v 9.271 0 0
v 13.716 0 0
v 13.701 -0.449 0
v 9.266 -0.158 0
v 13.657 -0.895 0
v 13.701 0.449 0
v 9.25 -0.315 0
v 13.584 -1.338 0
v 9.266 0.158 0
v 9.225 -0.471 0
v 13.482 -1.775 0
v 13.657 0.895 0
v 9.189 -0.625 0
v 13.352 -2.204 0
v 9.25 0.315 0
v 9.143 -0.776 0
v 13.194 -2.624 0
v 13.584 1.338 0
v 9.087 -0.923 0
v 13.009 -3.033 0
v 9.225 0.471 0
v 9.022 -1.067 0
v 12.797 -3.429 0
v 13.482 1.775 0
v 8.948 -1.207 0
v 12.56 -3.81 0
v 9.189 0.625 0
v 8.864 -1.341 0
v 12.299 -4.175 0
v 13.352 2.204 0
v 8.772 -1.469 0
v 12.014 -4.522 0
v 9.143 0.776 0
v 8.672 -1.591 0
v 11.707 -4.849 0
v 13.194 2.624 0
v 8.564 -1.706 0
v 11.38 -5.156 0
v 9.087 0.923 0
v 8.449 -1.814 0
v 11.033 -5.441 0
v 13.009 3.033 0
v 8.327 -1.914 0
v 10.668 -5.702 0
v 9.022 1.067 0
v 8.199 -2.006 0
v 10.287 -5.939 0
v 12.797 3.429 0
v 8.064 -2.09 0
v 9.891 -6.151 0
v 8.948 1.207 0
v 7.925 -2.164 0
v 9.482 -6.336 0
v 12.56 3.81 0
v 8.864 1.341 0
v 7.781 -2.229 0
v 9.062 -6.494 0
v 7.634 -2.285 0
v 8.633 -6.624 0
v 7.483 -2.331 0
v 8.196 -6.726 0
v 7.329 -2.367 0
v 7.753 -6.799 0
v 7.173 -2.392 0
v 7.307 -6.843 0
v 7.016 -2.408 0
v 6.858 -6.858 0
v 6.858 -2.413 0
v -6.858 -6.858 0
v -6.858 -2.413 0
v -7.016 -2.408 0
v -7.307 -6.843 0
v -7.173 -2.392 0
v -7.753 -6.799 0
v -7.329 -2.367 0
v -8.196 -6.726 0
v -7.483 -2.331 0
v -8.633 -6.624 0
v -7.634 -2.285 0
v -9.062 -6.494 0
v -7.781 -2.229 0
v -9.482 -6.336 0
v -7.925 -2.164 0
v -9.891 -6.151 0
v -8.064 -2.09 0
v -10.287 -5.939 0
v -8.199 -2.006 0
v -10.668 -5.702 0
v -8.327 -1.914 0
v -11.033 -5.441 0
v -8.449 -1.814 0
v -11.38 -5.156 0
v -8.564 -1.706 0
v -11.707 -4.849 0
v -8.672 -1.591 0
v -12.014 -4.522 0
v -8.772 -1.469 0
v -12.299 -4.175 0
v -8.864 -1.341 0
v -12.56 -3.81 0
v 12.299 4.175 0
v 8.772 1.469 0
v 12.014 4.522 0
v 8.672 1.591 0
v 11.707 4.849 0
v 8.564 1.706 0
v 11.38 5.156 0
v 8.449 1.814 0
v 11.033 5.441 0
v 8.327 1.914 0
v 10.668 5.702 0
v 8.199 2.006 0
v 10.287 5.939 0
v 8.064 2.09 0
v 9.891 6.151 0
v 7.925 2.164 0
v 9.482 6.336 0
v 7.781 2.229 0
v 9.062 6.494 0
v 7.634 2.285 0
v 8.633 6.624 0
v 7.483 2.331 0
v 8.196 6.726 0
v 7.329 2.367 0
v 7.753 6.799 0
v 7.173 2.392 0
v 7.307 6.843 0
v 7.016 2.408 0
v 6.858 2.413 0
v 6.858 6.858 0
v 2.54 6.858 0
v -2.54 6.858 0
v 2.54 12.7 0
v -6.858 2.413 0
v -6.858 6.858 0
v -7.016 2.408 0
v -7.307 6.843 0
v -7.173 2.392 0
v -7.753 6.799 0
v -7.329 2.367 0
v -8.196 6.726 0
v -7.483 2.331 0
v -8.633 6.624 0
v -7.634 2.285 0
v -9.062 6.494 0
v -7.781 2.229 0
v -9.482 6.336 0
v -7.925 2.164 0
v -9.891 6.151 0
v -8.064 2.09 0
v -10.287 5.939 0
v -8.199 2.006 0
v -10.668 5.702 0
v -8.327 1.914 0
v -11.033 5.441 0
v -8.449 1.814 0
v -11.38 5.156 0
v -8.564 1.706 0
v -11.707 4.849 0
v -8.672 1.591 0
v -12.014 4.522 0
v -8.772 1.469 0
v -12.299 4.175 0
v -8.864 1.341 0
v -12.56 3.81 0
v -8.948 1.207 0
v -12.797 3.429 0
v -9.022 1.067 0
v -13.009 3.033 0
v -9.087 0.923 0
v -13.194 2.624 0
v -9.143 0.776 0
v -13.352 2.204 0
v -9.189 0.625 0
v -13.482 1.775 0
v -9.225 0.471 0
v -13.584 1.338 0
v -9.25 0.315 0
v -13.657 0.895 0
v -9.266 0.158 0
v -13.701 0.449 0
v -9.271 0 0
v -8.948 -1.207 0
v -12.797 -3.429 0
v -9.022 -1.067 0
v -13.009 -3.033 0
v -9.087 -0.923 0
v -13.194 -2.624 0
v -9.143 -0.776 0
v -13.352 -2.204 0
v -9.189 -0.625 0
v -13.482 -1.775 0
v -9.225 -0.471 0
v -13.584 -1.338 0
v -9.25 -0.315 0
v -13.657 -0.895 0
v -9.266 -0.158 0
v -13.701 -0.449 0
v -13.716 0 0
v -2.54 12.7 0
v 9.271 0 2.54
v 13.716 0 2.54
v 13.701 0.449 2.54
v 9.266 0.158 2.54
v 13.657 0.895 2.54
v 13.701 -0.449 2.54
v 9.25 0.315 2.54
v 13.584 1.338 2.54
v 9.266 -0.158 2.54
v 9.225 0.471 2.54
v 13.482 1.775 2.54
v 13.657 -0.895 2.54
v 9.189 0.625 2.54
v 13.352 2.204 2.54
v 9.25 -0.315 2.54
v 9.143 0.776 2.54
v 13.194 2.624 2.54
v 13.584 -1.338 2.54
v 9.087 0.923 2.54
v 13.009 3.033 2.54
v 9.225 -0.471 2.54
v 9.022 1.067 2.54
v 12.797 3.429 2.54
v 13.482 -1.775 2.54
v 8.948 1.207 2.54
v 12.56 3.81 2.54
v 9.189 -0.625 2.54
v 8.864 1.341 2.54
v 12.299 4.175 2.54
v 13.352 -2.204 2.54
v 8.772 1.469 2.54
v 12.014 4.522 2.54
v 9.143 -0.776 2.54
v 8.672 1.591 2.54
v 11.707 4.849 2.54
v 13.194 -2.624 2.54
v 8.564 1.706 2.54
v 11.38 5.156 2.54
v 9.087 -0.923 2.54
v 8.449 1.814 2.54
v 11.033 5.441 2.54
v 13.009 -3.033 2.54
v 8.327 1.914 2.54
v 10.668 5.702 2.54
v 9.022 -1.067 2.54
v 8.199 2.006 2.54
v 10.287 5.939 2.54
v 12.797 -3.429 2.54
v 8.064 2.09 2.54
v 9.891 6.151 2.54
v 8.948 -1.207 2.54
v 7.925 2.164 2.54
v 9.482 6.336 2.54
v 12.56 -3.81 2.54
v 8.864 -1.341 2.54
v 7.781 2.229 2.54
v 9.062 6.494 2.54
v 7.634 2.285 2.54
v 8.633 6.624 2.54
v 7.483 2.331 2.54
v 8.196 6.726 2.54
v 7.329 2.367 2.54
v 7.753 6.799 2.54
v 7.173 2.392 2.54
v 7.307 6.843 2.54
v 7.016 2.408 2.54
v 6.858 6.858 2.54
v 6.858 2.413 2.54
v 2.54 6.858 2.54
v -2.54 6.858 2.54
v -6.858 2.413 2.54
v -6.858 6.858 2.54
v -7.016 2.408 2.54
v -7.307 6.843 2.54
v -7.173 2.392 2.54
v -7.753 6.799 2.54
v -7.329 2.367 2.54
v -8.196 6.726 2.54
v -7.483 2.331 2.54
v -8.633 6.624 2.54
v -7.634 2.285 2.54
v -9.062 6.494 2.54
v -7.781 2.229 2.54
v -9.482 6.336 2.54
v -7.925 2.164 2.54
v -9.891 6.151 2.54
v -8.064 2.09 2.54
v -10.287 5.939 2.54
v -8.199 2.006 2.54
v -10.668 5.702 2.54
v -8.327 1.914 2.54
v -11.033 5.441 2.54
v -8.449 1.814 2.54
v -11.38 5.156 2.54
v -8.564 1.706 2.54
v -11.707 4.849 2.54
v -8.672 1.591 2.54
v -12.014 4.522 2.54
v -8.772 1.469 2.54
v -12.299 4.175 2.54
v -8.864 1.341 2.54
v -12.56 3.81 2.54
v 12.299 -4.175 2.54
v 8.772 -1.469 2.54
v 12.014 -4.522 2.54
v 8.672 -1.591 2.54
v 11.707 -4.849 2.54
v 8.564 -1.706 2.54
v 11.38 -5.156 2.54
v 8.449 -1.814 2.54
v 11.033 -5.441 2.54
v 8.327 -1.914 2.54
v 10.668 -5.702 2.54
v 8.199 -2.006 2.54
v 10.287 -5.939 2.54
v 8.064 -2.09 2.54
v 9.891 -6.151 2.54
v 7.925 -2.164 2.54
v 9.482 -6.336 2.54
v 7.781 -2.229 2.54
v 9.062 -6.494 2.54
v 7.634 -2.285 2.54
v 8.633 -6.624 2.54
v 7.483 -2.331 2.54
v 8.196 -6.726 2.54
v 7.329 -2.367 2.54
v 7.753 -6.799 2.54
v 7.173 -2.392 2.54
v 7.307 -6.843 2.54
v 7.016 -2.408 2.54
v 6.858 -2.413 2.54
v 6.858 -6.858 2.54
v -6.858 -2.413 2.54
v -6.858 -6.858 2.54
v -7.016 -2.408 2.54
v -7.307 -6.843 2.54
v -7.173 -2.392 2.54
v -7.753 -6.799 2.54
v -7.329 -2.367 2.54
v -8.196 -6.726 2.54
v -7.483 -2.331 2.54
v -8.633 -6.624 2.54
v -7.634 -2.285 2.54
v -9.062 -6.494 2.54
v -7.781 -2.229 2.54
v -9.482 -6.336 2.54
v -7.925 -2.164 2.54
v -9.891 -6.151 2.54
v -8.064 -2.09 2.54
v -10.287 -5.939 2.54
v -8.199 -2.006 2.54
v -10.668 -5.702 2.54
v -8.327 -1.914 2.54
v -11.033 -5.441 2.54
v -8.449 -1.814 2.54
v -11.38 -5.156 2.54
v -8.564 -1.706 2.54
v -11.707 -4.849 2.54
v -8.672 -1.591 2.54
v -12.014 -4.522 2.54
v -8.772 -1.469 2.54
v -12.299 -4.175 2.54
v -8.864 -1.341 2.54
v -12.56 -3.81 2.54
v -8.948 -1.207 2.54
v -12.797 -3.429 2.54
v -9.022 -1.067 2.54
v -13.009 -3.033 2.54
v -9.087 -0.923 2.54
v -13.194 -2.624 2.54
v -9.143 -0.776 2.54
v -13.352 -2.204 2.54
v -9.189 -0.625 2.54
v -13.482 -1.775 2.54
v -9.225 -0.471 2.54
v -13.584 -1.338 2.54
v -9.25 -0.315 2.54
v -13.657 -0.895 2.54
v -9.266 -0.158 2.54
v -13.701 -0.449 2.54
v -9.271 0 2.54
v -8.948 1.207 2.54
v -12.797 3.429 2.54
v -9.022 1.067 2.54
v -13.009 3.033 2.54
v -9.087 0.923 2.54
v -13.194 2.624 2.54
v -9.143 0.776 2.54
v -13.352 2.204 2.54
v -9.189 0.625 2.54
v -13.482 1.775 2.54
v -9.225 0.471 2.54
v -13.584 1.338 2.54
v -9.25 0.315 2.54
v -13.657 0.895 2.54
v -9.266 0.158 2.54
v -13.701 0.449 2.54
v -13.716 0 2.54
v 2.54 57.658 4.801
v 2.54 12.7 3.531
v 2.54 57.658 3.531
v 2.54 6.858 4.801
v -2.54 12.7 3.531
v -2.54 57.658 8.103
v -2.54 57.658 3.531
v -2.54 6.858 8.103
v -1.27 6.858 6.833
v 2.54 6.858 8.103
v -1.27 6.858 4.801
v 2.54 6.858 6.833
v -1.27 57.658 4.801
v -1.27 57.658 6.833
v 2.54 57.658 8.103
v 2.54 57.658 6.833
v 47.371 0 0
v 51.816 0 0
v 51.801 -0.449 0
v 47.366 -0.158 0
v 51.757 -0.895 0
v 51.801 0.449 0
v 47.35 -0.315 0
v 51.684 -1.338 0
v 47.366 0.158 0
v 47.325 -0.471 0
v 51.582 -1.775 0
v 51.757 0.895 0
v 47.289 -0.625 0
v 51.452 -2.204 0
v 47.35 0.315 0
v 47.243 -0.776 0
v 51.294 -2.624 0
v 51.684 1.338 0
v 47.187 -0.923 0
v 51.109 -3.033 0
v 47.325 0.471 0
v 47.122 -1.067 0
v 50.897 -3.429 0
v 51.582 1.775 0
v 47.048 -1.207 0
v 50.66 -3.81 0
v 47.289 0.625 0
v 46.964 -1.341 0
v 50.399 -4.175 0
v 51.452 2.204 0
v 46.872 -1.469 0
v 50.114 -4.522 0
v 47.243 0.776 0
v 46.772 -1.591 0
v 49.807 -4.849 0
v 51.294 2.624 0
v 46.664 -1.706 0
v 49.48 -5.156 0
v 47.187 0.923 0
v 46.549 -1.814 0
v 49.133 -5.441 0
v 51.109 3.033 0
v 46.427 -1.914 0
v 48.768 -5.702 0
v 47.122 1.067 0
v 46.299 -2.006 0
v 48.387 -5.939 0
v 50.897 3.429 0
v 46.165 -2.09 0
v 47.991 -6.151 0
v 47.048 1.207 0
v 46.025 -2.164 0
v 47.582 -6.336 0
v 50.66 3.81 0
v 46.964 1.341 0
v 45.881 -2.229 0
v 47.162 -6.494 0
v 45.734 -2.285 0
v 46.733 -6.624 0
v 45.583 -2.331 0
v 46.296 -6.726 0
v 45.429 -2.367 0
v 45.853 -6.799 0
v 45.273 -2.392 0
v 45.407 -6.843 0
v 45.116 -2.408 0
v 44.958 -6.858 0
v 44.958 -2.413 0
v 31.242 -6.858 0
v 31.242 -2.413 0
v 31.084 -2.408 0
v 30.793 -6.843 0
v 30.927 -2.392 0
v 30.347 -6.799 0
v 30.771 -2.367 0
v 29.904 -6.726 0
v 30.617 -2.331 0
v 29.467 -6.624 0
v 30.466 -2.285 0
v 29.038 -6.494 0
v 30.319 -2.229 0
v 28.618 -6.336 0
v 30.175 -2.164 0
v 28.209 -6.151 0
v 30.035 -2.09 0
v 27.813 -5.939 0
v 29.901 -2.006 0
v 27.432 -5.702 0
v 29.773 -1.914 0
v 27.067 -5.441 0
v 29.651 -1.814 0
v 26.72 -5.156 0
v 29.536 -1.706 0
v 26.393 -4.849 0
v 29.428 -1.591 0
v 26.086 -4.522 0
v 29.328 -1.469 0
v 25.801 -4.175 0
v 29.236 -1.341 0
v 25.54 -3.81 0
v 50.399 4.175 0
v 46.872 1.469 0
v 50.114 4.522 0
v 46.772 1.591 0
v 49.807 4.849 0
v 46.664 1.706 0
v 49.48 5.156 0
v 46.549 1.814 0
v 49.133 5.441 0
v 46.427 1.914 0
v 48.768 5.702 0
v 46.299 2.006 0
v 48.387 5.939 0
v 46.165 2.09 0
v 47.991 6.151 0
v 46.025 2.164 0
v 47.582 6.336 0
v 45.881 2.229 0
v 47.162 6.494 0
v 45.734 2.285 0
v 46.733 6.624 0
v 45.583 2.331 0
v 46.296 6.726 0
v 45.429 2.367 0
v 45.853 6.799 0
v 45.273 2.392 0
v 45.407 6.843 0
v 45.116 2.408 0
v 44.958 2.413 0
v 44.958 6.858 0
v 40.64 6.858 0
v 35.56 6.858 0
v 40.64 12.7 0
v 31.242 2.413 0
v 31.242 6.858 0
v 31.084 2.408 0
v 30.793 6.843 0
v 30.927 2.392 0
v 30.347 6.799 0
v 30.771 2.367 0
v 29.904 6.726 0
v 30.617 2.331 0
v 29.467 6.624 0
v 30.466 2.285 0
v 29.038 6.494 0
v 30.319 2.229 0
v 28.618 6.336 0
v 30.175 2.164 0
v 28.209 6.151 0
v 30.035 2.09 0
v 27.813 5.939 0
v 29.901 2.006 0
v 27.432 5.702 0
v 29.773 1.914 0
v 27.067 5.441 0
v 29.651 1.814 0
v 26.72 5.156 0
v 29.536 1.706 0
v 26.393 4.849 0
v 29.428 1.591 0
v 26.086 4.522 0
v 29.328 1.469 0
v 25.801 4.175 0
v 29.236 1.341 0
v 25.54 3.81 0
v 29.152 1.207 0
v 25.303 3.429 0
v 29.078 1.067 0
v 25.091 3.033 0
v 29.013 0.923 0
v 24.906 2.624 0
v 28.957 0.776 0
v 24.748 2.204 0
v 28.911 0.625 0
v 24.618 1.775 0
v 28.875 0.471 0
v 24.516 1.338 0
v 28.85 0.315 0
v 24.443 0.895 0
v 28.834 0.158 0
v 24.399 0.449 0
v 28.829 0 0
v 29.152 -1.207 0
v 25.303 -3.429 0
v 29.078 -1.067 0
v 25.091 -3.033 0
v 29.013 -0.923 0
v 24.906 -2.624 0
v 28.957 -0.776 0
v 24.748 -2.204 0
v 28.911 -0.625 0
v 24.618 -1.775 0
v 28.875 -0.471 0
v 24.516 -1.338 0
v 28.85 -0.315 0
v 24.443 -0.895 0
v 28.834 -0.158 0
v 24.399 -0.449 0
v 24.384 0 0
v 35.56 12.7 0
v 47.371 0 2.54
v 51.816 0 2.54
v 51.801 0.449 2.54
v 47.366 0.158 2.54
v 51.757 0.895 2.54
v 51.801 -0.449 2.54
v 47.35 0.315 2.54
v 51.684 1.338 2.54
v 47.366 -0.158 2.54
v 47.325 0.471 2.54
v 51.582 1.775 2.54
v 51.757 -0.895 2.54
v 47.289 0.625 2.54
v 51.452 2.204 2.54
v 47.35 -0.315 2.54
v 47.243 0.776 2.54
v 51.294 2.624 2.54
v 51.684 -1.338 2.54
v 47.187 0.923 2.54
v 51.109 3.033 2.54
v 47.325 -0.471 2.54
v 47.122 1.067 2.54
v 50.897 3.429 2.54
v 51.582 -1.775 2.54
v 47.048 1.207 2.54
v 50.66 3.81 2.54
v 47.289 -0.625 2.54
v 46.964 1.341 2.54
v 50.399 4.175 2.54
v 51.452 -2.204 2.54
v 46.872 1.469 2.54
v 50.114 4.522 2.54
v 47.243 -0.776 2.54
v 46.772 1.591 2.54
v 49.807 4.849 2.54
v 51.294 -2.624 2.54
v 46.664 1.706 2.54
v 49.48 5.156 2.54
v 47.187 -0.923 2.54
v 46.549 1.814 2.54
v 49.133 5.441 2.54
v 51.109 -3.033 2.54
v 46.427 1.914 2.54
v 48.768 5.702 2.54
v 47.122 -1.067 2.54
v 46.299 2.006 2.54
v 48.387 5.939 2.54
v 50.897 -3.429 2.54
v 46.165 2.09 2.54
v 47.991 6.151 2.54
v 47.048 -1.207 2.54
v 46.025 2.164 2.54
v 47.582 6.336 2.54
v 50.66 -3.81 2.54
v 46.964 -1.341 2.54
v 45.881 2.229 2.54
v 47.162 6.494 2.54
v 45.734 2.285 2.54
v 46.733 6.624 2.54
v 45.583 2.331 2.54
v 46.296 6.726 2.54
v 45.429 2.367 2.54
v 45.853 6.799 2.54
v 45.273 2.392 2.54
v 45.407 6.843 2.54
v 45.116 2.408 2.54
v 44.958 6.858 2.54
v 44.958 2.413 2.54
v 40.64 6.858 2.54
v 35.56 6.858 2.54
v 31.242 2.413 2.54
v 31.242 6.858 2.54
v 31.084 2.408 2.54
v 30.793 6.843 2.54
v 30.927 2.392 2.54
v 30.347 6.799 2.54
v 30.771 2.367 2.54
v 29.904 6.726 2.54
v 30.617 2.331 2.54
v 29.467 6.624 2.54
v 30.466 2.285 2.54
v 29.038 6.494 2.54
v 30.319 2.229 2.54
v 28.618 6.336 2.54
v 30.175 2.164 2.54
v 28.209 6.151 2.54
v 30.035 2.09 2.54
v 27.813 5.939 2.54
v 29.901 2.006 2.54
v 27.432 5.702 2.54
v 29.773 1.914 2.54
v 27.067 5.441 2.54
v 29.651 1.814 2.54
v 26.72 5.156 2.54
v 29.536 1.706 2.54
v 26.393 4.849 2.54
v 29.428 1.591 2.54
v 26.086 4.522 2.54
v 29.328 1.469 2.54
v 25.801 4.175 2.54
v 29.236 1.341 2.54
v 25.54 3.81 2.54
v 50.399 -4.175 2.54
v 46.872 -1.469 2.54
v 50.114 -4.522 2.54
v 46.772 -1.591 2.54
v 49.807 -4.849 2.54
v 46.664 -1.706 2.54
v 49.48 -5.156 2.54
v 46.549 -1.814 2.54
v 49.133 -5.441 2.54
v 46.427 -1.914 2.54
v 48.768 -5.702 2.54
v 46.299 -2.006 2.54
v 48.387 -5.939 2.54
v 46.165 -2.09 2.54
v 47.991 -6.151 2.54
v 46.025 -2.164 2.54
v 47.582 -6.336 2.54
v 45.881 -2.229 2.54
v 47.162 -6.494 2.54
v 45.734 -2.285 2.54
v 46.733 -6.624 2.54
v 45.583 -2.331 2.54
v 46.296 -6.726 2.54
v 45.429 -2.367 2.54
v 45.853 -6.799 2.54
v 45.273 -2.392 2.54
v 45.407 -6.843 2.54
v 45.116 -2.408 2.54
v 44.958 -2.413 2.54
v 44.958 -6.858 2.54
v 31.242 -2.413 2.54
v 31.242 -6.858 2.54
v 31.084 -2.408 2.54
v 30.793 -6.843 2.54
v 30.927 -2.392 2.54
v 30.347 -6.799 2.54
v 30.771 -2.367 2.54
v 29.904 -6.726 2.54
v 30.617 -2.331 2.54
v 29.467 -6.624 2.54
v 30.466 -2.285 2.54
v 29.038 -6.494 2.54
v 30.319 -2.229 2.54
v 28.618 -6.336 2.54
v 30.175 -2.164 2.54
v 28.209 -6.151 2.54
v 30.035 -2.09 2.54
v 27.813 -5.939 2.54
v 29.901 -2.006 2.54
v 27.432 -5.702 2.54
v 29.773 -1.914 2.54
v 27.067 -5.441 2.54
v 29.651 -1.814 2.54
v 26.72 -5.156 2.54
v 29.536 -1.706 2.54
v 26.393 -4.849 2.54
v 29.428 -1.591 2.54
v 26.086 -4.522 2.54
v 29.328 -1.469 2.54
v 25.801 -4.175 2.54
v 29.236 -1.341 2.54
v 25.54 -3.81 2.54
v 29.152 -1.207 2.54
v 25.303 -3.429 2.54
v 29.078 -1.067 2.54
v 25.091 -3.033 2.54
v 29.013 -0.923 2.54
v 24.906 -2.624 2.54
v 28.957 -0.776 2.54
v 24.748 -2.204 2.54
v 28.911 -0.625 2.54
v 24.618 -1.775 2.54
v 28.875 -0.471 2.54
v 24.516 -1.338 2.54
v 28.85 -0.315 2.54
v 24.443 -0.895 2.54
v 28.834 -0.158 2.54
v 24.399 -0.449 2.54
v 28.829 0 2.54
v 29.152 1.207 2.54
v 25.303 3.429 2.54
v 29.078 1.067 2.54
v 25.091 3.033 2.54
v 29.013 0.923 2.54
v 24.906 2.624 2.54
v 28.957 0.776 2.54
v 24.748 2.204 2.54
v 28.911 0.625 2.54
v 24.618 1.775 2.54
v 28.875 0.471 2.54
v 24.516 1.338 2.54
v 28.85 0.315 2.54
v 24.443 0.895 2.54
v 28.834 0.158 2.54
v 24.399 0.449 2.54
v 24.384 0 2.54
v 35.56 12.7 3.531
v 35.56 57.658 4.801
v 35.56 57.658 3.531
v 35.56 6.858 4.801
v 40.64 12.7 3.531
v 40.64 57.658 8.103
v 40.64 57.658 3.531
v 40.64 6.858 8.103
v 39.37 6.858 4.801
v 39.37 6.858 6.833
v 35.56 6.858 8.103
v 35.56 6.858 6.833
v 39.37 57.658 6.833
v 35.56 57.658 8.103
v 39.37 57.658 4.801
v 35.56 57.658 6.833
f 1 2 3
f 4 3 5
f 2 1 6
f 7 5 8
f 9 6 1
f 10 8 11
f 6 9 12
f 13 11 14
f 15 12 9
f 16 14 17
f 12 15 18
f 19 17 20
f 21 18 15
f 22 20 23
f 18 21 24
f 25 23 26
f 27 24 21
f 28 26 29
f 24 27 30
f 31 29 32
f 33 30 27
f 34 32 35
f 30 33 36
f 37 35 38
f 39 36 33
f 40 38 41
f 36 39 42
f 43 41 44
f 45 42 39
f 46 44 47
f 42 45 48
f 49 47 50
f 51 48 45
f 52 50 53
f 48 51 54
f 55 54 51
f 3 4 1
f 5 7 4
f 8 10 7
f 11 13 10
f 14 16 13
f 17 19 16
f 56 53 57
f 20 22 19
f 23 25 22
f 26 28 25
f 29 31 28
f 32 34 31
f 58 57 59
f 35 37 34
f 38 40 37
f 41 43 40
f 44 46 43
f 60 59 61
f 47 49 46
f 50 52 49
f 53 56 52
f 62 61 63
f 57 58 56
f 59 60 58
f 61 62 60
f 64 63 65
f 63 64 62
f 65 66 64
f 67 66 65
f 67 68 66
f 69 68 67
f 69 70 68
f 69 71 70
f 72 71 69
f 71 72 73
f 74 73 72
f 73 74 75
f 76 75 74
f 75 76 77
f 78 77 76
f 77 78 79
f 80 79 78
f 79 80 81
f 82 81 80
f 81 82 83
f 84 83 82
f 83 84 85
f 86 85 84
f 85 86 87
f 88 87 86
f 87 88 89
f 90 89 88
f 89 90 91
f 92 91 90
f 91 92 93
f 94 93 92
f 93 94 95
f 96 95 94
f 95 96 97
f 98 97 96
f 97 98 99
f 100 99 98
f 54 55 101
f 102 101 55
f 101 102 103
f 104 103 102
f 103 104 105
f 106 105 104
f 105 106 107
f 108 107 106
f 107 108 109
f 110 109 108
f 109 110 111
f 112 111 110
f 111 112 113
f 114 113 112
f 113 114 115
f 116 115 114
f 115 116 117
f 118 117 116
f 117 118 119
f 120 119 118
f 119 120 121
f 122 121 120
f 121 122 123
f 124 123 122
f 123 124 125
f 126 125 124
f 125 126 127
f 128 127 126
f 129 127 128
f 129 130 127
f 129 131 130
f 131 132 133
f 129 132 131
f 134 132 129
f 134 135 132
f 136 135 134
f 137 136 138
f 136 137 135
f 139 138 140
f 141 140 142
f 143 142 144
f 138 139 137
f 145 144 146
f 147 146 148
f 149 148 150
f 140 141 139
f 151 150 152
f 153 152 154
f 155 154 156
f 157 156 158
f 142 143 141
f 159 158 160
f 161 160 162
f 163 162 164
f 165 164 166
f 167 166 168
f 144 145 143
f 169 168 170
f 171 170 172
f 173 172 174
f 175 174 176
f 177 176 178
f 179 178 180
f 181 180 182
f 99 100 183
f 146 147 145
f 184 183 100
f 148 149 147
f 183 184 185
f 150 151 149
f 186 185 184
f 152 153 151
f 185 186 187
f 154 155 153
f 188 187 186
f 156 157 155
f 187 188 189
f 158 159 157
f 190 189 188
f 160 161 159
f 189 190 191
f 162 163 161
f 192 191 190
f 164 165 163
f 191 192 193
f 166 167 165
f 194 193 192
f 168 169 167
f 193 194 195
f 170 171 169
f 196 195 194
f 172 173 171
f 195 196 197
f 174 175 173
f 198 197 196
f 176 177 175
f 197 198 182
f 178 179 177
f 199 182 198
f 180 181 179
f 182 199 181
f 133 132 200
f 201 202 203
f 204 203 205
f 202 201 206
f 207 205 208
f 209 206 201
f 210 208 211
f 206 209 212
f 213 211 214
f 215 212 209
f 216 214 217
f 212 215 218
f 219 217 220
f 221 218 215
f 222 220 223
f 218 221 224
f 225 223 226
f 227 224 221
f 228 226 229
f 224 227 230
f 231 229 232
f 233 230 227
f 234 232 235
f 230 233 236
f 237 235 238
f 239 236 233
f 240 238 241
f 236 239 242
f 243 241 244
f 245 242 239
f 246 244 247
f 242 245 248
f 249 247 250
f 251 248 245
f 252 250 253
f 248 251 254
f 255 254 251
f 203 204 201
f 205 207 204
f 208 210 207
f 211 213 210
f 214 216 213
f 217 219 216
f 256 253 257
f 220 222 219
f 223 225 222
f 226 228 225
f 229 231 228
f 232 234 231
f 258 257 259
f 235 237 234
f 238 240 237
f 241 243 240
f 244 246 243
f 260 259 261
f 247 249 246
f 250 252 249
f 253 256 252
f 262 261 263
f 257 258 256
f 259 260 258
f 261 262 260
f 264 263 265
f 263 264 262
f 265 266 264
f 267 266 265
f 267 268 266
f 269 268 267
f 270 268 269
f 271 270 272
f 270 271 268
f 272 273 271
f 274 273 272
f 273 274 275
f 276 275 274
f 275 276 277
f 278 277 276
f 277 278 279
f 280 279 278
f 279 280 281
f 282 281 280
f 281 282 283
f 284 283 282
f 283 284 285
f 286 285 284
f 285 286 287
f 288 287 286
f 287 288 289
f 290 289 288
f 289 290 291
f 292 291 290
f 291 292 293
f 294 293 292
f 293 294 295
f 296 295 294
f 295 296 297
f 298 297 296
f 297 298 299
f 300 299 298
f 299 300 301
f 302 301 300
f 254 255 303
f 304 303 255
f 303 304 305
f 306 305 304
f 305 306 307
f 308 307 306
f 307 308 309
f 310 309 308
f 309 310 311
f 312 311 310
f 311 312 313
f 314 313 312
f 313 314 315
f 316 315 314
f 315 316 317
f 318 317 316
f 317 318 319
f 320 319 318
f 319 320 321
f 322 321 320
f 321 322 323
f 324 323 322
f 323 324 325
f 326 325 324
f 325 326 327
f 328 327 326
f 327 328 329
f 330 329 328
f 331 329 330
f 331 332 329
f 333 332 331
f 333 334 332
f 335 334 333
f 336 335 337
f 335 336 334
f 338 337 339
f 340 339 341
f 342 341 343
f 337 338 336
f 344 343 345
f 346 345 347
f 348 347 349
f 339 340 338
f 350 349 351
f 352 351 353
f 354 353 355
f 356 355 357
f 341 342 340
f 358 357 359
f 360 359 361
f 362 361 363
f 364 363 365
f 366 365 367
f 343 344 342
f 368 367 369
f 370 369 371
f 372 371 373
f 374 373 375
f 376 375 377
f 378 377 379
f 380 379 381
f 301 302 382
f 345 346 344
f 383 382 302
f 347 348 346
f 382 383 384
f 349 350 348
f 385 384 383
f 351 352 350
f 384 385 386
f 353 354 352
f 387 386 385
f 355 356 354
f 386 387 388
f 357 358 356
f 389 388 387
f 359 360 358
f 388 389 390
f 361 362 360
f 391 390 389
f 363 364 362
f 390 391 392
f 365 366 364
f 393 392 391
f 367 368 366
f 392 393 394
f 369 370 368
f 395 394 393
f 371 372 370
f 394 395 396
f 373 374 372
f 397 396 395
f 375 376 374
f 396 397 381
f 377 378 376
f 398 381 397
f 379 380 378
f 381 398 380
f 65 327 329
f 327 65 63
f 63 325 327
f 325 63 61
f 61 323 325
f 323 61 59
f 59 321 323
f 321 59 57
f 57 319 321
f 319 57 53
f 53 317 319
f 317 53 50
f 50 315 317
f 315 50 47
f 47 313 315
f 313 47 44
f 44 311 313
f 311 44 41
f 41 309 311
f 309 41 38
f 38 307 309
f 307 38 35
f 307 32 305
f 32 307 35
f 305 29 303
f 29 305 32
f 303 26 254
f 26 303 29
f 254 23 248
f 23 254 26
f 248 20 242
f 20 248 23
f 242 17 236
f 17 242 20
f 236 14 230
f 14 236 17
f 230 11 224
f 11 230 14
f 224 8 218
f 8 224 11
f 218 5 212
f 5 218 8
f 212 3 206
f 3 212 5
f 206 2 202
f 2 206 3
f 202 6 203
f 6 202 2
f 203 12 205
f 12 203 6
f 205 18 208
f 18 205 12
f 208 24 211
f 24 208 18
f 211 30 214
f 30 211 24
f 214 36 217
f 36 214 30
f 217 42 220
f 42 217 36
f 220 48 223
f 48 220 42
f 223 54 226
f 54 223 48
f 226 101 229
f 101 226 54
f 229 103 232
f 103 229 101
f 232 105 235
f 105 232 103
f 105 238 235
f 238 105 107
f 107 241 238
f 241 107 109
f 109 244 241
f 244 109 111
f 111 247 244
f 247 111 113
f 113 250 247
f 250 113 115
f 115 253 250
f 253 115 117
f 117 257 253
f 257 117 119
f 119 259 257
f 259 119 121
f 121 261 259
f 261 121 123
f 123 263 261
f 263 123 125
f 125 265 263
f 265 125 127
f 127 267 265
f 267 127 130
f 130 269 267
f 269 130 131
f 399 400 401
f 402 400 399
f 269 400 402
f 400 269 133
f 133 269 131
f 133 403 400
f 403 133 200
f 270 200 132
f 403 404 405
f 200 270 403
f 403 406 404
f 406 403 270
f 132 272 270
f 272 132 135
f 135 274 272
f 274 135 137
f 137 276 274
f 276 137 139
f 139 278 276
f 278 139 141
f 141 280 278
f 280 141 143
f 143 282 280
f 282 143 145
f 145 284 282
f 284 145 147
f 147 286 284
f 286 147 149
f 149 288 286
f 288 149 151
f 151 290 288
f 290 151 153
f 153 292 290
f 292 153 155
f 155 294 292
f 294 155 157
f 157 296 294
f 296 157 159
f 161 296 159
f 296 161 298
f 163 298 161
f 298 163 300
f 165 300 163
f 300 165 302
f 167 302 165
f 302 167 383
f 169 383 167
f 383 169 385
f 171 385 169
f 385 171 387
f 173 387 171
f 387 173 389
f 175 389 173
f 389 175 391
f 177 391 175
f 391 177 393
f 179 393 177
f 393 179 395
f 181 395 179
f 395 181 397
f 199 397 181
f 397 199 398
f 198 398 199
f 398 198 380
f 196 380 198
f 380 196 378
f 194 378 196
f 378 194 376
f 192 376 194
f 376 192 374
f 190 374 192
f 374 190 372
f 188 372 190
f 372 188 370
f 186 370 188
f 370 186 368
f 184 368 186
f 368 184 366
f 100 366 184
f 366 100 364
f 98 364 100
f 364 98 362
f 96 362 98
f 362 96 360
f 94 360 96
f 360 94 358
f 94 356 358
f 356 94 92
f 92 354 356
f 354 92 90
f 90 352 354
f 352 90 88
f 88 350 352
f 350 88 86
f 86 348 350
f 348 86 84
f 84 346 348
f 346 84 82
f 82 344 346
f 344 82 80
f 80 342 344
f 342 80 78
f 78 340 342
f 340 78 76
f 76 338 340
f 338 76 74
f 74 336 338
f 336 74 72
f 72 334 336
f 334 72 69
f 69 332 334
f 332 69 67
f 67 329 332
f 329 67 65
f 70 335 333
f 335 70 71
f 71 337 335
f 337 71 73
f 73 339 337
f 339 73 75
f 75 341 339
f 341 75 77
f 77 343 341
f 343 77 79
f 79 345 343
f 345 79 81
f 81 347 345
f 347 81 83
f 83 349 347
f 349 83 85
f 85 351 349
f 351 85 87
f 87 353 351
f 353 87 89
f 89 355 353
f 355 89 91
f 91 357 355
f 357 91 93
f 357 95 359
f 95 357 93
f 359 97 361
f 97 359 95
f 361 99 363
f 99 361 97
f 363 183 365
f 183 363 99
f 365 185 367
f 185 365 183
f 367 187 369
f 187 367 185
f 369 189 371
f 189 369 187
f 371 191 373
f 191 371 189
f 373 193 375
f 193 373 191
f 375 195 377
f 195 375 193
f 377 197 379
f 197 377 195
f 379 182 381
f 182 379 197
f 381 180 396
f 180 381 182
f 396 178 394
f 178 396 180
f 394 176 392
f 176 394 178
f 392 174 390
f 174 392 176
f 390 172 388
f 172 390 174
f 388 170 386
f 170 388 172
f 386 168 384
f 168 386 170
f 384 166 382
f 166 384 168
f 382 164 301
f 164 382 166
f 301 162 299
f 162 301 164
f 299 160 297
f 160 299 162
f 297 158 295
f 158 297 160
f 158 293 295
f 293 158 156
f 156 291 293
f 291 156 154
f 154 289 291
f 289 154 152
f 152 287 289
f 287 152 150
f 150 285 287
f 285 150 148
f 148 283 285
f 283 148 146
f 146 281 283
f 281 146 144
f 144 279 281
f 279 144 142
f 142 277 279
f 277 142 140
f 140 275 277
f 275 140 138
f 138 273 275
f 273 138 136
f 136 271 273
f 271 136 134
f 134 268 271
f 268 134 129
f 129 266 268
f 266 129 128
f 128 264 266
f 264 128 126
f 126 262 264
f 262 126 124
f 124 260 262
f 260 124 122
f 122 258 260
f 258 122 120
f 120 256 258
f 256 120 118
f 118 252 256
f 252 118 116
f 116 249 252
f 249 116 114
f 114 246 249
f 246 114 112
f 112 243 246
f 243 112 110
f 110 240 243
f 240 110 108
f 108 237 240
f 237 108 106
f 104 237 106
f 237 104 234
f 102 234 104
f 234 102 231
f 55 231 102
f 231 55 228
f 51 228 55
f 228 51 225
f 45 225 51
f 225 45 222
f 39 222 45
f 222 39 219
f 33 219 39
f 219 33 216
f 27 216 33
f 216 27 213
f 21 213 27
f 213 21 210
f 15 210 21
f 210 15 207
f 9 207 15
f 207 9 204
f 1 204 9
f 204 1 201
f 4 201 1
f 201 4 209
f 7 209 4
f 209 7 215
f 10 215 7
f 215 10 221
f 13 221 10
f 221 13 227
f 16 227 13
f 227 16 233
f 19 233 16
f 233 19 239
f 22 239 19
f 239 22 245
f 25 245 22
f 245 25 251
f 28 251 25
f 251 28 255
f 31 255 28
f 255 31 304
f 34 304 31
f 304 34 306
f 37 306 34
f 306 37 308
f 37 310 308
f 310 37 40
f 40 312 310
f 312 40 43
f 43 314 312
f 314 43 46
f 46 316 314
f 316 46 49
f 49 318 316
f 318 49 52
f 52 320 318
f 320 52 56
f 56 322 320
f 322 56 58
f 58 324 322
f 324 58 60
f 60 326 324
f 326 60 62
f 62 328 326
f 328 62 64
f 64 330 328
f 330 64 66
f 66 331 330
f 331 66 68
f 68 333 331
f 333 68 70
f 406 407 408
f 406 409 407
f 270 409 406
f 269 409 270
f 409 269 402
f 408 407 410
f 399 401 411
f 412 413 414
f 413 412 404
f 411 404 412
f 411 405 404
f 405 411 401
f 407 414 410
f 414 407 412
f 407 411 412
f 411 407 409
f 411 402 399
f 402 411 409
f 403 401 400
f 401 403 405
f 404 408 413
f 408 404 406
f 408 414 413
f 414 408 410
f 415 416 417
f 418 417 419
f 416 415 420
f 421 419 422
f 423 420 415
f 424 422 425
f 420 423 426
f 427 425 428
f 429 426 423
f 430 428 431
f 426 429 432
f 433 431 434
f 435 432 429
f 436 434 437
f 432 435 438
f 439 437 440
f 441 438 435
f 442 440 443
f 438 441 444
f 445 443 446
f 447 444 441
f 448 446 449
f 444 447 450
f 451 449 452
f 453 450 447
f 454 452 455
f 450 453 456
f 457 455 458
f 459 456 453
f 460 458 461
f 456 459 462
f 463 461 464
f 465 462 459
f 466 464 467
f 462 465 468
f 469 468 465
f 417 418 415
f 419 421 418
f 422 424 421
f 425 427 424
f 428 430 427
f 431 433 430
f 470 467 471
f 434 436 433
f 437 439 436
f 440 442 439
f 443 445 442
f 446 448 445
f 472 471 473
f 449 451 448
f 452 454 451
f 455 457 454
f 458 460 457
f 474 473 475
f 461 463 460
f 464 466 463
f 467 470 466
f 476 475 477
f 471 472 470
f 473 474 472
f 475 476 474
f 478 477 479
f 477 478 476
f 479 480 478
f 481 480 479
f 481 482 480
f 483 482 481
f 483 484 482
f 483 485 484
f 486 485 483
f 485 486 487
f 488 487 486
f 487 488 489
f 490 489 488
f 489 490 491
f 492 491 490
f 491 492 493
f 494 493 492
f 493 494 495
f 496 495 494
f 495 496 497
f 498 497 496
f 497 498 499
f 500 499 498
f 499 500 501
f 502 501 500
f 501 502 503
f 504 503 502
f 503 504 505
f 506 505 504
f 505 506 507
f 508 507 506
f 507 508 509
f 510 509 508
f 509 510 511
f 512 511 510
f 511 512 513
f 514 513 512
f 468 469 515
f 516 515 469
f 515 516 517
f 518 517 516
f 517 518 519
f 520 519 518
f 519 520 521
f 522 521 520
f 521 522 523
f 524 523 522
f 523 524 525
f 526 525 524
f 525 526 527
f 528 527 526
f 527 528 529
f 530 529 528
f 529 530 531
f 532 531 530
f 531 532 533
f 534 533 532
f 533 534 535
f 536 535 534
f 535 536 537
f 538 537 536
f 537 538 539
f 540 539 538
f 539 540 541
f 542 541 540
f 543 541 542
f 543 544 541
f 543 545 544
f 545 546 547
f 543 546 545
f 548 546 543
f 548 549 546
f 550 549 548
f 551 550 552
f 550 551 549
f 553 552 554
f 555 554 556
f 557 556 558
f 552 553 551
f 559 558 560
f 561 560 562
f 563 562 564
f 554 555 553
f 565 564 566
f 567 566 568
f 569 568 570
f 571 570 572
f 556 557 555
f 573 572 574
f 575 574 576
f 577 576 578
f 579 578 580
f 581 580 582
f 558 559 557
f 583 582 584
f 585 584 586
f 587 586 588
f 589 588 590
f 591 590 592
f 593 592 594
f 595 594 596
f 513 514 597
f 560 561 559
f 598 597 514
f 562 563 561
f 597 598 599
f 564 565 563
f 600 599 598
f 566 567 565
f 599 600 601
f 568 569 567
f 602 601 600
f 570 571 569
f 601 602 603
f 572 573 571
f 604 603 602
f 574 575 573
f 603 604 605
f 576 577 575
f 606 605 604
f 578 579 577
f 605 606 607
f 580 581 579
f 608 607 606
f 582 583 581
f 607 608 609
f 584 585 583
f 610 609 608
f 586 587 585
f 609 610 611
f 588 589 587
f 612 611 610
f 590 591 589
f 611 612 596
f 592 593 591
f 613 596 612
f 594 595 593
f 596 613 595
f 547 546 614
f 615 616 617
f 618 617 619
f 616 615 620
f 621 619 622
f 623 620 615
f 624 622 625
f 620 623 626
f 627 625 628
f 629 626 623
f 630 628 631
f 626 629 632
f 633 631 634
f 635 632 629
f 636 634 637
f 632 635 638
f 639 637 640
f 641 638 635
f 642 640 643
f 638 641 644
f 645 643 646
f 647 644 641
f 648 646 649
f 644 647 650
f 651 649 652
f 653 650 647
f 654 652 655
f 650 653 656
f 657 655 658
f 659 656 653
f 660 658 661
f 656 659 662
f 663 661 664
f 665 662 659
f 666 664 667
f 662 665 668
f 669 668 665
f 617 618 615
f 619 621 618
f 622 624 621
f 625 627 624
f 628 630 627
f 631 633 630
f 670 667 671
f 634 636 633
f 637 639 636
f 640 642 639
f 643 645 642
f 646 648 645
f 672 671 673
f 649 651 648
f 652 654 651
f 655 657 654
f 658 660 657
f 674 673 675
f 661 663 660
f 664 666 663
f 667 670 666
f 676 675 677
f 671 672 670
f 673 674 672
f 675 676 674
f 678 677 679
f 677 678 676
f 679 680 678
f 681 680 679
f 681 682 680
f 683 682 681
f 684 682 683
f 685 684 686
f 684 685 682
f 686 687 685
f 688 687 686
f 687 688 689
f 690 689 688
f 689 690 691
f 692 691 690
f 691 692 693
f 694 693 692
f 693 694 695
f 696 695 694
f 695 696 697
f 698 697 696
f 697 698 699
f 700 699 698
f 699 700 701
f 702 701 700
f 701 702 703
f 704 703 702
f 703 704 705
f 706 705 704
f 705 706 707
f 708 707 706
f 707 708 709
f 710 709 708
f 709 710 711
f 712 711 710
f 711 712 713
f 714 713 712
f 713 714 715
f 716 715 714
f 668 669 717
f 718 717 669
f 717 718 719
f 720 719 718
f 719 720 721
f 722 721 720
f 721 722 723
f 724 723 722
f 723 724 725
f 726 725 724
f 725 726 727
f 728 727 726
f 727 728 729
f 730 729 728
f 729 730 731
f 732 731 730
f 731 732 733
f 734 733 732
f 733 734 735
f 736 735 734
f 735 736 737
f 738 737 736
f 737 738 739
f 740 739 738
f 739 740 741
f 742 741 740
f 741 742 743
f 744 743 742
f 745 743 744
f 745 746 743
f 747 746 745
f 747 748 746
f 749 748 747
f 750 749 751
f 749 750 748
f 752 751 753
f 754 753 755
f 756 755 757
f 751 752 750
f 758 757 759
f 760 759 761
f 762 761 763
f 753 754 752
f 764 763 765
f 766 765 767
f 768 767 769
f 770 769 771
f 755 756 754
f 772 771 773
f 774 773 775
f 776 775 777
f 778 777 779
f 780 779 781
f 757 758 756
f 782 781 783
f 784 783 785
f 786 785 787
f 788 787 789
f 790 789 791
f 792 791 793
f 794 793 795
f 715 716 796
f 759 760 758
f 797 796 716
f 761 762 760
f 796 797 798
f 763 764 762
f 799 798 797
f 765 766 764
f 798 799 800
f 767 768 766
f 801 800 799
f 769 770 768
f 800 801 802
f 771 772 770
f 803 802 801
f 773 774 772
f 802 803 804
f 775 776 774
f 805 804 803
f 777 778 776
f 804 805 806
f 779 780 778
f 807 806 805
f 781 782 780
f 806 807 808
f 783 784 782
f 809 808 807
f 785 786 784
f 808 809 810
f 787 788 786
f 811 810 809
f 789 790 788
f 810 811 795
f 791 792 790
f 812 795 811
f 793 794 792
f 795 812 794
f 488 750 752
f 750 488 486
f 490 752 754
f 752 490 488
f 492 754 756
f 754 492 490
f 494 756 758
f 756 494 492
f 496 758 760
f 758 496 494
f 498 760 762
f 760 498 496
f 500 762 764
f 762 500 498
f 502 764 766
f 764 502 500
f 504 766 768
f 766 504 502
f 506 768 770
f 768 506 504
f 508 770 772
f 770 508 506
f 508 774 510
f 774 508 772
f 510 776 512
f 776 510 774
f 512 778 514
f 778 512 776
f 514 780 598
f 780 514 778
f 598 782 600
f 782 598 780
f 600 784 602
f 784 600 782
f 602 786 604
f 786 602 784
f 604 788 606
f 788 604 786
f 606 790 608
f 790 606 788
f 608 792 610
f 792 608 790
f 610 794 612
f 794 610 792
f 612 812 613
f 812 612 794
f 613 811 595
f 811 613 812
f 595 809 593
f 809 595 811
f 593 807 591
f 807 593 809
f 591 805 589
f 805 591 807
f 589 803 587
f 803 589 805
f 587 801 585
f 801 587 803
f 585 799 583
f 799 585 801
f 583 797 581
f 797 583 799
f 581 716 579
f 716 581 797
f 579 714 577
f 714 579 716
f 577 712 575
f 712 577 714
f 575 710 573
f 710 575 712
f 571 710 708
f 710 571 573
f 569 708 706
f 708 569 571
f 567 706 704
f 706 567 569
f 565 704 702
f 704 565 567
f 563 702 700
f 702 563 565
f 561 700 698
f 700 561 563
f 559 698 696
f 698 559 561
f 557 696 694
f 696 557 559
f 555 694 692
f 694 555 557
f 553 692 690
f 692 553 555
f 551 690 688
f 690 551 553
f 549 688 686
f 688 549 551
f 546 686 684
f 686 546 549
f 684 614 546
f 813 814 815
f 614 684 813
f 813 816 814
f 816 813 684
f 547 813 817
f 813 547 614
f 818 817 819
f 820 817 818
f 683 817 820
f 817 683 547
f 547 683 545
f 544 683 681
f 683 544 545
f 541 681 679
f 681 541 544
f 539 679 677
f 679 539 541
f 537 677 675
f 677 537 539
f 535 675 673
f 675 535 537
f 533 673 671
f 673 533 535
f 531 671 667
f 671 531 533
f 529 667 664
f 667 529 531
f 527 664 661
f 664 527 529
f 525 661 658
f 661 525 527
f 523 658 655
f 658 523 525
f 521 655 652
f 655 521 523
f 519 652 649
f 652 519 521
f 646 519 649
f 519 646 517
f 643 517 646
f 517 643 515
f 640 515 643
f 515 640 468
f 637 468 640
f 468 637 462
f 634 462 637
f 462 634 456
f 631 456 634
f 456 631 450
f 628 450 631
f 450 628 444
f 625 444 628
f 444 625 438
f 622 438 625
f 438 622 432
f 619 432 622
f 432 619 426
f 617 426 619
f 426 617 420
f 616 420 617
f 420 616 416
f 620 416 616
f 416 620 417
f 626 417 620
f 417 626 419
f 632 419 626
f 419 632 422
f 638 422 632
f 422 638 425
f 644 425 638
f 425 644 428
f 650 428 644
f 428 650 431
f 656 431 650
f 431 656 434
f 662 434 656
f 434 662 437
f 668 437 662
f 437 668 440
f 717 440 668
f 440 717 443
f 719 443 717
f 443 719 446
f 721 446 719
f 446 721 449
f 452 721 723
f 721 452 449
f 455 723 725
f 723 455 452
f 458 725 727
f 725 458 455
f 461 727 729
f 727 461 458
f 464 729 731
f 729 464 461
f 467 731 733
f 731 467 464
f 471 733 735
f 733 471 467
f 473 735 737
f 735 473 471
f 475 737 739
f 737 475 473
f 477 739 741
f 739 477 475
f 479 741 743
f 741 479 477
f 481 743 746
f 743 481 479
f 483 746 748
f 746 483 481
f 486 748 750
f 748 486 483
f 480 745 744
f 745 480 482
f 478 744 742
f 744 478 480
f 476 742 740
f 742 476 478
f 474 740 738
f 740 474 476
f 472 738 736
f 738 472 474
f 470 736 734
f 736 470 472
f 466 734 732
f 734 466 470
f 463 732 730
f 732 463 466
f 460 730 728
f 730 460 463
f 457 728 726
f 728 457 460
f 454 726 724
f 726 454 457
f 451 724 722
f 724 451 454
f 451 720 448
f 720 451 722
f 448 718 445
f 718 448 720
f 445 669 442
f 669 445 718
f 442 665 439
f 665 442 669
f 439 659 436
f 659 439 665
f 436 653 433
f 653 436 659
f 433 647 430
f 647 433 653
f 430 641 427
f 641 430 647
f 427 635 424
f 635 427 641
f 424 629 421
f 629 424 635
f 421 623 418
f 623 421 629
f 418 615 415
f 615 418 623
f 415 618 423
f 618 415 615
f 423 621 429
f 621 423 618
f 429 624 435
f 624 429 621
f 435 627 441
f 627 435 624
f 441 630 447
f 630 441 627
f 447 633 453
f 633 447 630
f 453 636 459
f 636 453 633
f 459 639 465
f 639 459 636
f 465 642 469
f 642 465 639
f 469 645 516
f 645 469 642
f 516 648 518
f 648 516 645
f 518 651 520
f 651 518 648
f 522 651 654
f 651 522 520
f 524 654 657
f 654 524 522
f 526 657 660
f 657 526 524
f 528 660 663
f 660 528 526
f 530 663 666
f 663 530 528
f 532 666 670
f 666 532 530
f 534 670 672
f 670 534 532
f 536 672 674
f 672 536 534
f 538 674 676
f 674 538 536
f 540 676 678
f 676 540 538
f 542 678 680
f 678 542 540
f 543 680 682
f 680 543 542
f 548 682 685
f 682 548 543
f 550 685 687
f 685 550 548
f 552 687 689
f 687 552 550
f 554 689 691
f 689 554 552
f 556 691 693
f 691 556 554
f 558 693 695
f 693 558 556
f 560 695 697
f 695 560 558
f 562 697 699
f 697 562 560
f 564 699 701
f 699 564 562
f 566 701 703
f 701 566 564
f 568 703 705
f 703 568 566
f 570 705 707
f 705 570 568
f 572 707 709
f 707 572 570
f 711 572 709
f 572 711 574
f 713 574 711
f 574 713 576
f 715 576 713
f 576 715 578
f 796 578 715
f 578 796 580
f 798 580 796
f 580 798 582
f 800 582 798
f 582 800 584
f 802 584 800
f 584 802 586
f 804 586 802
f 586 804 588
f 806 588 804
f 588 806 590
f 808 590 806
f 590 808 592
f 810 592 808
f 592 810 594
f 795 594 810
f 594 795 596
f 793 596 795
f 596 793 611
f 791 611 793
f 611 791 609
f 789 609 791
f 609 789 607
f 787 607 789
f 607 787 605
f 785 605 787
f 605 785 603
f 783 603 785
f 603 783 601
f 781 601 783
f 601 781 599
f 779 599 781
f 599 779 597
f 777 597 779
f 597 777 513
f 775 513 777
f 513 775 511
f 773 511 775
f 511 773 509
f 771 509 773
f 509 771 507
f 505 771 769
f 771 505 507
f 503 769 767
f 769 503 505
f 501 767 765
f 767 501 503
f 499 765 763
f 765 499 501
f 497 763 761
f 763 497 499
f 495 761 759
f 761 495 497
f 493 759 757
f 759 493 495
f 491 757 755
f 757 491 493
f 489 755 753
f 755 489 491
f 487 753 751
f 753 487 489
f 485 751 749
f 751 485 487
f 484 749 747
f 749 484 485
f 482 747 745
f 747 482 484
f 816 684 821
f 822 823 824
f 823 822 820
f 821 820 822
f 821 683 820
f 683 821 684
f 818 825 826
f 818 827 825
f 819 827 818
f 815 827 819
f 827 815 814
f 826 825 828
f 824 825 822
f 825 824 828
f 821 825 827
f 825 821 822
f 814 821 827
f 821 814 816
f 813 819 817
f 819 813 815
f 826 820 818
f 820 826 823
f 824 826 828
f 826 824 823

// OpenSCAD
// file: ../../models/veroboard.scad
module model_Veroboard(holesX, holesY)
{
    color("darkgoldenrod")
    linear_extrude(50)
    difference()
    {
        square([100 * holesX, 100 * holesY]);
        for (xx = [0:1:holesX-1])
        {
            for (yy = [0:1:holesY-1])
            {
                translate([xx * 100+50, yy * 100+50, 0])
                circle(15, $fn=96);
            }
        }
    }
}
// main file
include <../../models/veroboard.scad>

ViewScale = [0.0254, 0.0254, 0.0254];


module screwmount()
{
    linear_extrude(100)
    difference()
    {
        union()
        {
            translate([0, 250, 0])
            square([200, 500], center=true);
            hull()
            {
                translate([-270, 0, 0])
                circle(270, $fn=96);
                translate([270, 0, 0])
                circle(270, $fn=96);
            }
        }
        hull()
        {
            translate([-270, 0, 0])
            circle(190/2, $fn=96);
            translate([270, 0, 0])
            circle(190/2, $fn=96);
        }
    }
    translate([0, 0, 99])
    linear_extrude(51)
    difference()
    {
        translate([0, 250, 0])
        square([200, 500], center=true);
//        square([200, 1000], center=true);
        hull()
        {
            translate([-270, 0, 0])
            circle(270, $fn=96);
            translate([270, 0, 0])
            circle(270, $fn=96);
        }
    }
}

module boardsupport(len)
{
    linear_extrude(len)
    difference()
    {
        square([200, 180], center=true);
        translate([50, 0, 0])
        square([200, 80], center=true);
    }
}

module vexmount()
{
    // board mount
    translate([0, 270, 229])
    rotate([-90, 0, 0])
    boardsupport(2000);

    *translate([0, -270, 229])
    rotate([90, 0, 0])
    boardsupport(1000);

    screwmount();
}

module forViewing()
{
//    model_Veroboard(20, 26);
    vexmount();
}

module forPrinting()
{
    vexmount();
    translate([1500, 0, 0])
    scale([-1, 1, 1])
    vexmount();
}

scale(ViewScale)
{
//    forViewing();
    forPrinting();
}
